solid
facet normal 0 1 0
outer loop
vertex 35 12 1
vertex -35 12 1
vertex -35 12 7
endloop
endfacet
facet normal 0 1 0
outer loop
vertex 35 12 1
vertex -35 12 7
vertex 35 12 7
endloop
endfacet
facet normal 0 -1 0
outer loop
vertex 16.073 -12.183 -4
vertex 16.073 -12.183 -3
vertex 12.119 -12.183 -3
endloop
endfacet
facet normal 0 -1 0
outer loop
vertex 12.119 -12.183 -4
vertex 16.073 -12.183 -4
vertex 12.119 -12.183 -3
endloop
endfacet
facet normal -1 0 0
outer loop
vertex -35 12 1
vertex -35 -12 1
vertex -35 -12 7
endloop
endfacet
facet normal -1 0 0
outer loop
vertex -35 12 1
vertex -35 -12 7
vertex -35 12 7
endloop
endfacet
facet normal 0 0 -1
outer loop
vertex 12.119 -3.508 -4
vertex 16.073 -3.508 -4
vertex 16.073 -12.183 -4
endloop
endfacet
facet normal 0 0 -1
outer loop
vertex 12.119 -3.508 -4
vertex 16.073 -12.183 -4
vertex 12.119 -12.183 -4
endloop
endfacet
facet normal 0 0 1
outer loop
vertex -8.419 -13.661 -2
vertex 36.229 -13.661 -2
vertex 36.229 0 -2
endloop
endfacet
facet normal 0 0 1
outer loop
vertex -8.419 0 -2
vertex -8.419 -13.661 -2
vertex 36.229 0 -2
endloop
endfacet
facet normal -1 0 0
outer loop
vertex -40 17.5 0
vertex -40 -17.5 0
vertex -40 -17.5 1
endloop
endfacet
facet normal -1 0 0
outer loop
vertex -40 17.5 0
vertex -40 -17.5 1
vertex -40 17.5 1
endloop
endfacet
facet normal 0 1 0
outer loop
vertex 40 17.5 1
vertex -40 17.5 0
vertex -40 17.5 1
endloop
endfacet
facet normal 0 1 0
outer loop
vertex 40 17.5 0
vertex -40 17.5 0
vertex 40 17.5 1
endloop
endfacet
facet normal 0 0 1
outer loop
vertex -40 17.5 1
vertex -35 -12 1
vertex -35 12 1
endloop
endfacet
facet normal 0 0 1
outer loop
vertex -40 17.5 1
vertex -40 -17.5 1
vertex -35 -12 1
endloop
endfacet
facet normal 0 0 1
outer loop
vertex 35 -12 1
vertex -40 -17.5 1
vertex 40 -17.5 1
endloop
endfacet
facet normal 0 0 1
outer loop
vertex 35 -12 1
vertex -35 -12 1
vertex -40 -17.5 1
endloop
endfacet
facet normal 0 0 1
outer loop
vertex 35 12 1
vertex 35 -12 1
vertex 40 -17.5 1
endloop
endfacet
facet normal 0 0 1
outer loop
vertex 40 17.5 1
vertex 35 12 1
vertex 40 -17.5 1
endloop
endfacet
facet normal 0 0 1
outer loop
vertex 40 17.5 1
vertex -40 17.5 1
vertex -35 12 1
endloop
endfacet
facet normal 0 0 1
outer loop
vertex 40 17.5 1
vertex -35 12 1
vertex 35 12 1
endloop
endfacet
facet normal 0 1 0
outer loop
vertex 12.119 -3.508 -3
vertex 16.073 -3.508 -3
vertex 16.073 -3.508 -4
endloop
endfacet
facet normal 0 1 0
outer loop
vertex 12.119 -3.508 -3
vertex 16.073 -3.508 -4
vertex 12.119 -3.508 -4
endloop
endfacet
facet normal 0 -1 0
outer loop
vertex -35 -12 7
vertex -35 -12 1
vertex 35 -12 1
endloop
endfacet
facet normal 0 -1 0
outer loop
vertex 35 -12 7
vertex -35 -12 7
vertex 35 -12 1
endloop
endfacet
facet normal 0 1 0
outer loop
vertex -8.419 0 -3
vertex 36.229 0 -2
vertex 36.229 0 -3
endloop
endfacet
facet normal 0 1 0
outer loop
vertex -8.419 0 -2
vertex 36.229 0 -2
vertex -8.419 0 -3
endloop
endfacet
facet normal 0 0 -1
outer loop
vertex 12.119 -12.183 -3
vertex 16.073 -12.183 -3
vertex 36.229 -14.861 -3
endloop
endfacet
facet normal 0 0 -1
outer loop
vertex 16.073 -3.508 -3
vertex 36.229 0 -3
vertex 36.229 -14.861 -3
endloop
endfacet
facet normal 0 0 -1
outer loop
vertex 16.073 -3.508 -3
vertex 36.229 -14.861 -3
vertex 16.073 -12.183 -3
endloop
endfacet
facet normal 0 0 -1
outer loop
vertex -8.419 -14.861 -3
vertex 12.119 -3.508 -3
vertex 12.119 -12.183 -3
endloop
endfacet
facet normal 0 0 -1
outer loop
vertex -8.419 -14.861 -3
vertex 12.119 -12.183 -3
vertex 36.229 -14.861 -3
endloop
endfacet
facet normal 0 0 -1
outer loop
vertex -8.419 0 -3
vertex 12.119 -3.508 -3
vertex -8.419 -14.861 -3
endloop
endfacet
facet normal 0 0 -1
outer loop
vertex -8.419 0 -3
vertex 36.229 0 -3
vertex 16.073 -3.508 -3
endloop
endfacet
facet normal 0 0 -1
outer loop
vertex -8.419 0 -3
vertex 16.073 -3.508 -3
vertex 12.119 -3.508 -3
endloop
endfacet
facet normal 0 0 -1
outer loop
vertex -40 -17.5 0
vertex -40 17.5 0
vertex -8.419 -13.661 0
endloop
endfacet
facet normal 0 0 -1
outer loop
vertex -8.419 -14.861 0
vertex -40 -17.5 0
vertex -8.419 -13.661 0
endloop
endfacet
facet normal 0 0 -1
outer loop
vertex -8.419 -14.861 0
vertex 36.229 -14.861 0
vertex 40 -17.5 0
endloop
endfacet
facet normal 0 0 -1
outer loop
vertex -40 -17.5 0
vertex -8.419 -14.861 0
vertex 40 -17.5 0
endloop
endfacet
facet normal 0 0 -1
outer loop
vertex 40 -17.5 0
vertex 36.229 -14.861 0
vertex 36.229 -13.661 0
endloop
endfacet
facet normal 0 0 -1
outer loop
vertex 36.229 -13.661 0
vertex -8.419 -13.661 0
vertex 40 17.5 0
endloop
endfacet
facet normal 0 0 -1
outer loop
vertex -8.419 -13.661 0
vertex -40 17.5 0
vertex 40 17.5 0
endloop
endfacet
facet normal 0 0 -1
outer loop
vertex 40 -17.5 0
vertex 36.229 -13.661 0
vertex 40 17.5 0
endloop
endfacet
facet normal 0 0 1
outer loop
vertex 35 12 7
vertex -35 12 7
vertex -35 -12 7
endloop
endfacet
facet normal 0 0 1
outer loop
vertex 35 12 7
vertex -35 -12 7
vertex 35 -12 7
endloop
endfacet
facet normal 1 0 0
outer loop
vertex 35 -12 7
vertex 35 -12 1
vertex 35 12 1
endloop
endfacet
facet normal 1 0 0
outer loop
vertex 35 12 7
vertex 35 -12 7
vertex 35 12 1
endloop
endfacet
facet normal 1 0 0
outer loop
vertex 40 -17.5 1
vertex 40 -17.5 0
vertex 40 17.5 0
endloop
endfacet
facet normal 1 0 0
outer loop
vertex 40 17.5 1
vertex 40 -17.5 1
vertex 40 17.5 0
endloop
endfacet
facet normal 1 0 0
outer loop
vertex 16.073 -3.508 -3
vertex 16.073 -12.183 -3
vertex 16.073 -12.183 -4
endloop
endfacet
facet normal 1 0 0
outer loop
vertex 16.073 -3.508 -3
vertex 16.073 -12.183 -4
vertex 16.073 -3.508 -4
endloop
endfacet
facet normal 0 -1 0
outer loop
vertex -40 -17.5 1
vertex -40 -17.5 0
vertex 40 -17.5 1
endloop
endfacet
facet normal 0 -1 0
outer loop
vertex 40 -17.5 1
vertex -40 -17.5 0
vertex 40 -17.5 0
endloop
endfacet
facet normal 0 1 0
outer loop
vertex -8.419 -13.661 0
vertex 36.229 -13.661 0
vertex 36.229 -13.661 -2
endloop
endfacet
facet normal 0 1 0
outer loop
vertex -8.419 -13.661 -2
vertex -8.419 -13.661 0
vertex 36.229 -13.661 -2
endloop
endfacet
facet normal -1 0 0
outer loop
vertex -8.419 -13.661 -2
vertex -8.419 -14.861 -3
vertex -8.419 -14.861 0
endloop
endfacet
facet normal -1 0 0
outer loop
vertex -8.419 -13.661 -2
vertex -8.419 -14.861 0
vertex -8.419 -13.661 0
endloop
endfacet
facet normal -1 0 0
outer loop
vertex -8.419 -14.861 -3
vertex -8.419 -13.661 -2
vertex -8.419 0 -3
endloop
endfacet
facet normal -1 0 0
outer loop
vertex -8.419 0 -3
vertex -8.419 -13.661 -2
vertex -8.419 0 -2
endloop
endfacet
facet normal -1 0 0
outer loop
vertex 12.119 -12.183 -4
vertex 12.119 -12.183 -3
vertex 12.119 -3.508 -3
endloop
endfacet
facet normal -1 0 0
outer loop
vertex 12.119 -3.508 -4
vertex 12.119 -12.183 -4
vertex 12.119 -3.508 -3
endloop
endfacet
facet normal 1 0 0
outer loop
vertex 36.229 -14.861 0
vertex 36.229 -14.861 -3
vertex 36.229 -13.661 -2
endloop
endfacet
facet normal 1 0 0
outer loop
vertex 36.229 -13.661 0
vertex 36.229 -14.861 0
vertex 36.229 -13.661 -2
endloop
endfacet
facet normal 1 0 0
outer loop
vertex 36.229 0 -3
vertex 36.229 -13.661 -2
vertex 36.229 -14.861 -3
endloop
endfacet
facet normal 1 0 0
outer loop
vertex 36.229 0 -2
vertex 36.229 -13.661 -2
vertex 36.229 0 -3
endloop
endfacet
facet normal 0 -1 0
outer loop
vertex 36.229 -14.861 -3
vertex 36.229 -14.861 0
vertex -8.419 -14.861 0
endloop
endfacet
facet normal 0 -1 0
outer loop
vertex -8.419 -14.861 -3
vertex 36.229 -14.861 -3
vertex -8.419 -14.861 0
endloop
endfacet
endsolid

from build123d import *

# Parameters (mm, degrees)
SKETCH1_W           = 80
SKETCH1_H           = 35
BOSS_EXTRUDE1_DEPTH = 1
SKETCH2_W           = 70
SKETCH2_H           = 24
BOSS_EXTRUDE2_DEPTH = 6
SKETCH3_W           = 44.648131597
SKETCH3_H           = 14.861449517
BOSS_EXTRUDE3_DEPTH = 3
SKETCH4_W           = 2
SKETCH4_H           = 14.195770454
CUT_EXTRUDE1_DEPTH  = 77.228769639
SKETCH5_W           = 3.954548799
SKETCH5_H           = 8.674494139
BOSS_EXTRUDE4_DEPTH = 1


with BuildPart() as part:
    # Sketch1 → Boss-Extrude1 (new body)
    with BuildSketch(Plane.XY):
        Rectangle(SKETCH1_W, SKETCH1_H)
    extrude(amount=BOSS_EXTRUDE1_DEPTH)

    # Sketch2 → Boss-Extrude2 (add)
    with BuildSketch(Plane.XY.offset(1)):
        Rectangle(SKETCH2_W, SKETCH2_H)
    extrude(amount=BOSS_EXTRUDE2_DEPTH)

    # Sketch3 → Boss-Extrude3 (add)
    with BuildSketch(Plane(origin=(0, 0, 0), x_dir=(-1, 0, 0), z_dir=(0, 0, -1))):
        with Locations((-13.90470384, -7.430724759)):
            Rectangle(SKETCH3_W, SKETCH3_H)
    extrude(amount=BOSS_EXTRUDE3_DEPTH)

    # Sketch4 → Cut-Extrude1 (cut, through all)
    with BuildSketch(Plane(origin=(36.228769639, 0, 0), x_dir=(0, 0, -1), z_dir=(1, 0, 0))):
        with Locations((1, -6.56356429)):
            Rectangle(SKETCH4_W, SKETCH4_H)
    extrude(amount=-CUT_EXTRUDE1_DEPTH, mode=Mode.SUBTRACT)

    # Sketch5 → Boss-Extrude4 (add)
    with BuildSketch(Plane(origin=(0, 0, -3), x_dir=(-1, 0, 0), z_dir=(0, 0, -1))):
        with Locations((-14.096052976, -7.845314553)):
            Rectangle(SKETCH5_W, SKETCH5_H)
    extrude(amount=BOSS_EXTRUDE4_DEPTH)


solid = part.part
